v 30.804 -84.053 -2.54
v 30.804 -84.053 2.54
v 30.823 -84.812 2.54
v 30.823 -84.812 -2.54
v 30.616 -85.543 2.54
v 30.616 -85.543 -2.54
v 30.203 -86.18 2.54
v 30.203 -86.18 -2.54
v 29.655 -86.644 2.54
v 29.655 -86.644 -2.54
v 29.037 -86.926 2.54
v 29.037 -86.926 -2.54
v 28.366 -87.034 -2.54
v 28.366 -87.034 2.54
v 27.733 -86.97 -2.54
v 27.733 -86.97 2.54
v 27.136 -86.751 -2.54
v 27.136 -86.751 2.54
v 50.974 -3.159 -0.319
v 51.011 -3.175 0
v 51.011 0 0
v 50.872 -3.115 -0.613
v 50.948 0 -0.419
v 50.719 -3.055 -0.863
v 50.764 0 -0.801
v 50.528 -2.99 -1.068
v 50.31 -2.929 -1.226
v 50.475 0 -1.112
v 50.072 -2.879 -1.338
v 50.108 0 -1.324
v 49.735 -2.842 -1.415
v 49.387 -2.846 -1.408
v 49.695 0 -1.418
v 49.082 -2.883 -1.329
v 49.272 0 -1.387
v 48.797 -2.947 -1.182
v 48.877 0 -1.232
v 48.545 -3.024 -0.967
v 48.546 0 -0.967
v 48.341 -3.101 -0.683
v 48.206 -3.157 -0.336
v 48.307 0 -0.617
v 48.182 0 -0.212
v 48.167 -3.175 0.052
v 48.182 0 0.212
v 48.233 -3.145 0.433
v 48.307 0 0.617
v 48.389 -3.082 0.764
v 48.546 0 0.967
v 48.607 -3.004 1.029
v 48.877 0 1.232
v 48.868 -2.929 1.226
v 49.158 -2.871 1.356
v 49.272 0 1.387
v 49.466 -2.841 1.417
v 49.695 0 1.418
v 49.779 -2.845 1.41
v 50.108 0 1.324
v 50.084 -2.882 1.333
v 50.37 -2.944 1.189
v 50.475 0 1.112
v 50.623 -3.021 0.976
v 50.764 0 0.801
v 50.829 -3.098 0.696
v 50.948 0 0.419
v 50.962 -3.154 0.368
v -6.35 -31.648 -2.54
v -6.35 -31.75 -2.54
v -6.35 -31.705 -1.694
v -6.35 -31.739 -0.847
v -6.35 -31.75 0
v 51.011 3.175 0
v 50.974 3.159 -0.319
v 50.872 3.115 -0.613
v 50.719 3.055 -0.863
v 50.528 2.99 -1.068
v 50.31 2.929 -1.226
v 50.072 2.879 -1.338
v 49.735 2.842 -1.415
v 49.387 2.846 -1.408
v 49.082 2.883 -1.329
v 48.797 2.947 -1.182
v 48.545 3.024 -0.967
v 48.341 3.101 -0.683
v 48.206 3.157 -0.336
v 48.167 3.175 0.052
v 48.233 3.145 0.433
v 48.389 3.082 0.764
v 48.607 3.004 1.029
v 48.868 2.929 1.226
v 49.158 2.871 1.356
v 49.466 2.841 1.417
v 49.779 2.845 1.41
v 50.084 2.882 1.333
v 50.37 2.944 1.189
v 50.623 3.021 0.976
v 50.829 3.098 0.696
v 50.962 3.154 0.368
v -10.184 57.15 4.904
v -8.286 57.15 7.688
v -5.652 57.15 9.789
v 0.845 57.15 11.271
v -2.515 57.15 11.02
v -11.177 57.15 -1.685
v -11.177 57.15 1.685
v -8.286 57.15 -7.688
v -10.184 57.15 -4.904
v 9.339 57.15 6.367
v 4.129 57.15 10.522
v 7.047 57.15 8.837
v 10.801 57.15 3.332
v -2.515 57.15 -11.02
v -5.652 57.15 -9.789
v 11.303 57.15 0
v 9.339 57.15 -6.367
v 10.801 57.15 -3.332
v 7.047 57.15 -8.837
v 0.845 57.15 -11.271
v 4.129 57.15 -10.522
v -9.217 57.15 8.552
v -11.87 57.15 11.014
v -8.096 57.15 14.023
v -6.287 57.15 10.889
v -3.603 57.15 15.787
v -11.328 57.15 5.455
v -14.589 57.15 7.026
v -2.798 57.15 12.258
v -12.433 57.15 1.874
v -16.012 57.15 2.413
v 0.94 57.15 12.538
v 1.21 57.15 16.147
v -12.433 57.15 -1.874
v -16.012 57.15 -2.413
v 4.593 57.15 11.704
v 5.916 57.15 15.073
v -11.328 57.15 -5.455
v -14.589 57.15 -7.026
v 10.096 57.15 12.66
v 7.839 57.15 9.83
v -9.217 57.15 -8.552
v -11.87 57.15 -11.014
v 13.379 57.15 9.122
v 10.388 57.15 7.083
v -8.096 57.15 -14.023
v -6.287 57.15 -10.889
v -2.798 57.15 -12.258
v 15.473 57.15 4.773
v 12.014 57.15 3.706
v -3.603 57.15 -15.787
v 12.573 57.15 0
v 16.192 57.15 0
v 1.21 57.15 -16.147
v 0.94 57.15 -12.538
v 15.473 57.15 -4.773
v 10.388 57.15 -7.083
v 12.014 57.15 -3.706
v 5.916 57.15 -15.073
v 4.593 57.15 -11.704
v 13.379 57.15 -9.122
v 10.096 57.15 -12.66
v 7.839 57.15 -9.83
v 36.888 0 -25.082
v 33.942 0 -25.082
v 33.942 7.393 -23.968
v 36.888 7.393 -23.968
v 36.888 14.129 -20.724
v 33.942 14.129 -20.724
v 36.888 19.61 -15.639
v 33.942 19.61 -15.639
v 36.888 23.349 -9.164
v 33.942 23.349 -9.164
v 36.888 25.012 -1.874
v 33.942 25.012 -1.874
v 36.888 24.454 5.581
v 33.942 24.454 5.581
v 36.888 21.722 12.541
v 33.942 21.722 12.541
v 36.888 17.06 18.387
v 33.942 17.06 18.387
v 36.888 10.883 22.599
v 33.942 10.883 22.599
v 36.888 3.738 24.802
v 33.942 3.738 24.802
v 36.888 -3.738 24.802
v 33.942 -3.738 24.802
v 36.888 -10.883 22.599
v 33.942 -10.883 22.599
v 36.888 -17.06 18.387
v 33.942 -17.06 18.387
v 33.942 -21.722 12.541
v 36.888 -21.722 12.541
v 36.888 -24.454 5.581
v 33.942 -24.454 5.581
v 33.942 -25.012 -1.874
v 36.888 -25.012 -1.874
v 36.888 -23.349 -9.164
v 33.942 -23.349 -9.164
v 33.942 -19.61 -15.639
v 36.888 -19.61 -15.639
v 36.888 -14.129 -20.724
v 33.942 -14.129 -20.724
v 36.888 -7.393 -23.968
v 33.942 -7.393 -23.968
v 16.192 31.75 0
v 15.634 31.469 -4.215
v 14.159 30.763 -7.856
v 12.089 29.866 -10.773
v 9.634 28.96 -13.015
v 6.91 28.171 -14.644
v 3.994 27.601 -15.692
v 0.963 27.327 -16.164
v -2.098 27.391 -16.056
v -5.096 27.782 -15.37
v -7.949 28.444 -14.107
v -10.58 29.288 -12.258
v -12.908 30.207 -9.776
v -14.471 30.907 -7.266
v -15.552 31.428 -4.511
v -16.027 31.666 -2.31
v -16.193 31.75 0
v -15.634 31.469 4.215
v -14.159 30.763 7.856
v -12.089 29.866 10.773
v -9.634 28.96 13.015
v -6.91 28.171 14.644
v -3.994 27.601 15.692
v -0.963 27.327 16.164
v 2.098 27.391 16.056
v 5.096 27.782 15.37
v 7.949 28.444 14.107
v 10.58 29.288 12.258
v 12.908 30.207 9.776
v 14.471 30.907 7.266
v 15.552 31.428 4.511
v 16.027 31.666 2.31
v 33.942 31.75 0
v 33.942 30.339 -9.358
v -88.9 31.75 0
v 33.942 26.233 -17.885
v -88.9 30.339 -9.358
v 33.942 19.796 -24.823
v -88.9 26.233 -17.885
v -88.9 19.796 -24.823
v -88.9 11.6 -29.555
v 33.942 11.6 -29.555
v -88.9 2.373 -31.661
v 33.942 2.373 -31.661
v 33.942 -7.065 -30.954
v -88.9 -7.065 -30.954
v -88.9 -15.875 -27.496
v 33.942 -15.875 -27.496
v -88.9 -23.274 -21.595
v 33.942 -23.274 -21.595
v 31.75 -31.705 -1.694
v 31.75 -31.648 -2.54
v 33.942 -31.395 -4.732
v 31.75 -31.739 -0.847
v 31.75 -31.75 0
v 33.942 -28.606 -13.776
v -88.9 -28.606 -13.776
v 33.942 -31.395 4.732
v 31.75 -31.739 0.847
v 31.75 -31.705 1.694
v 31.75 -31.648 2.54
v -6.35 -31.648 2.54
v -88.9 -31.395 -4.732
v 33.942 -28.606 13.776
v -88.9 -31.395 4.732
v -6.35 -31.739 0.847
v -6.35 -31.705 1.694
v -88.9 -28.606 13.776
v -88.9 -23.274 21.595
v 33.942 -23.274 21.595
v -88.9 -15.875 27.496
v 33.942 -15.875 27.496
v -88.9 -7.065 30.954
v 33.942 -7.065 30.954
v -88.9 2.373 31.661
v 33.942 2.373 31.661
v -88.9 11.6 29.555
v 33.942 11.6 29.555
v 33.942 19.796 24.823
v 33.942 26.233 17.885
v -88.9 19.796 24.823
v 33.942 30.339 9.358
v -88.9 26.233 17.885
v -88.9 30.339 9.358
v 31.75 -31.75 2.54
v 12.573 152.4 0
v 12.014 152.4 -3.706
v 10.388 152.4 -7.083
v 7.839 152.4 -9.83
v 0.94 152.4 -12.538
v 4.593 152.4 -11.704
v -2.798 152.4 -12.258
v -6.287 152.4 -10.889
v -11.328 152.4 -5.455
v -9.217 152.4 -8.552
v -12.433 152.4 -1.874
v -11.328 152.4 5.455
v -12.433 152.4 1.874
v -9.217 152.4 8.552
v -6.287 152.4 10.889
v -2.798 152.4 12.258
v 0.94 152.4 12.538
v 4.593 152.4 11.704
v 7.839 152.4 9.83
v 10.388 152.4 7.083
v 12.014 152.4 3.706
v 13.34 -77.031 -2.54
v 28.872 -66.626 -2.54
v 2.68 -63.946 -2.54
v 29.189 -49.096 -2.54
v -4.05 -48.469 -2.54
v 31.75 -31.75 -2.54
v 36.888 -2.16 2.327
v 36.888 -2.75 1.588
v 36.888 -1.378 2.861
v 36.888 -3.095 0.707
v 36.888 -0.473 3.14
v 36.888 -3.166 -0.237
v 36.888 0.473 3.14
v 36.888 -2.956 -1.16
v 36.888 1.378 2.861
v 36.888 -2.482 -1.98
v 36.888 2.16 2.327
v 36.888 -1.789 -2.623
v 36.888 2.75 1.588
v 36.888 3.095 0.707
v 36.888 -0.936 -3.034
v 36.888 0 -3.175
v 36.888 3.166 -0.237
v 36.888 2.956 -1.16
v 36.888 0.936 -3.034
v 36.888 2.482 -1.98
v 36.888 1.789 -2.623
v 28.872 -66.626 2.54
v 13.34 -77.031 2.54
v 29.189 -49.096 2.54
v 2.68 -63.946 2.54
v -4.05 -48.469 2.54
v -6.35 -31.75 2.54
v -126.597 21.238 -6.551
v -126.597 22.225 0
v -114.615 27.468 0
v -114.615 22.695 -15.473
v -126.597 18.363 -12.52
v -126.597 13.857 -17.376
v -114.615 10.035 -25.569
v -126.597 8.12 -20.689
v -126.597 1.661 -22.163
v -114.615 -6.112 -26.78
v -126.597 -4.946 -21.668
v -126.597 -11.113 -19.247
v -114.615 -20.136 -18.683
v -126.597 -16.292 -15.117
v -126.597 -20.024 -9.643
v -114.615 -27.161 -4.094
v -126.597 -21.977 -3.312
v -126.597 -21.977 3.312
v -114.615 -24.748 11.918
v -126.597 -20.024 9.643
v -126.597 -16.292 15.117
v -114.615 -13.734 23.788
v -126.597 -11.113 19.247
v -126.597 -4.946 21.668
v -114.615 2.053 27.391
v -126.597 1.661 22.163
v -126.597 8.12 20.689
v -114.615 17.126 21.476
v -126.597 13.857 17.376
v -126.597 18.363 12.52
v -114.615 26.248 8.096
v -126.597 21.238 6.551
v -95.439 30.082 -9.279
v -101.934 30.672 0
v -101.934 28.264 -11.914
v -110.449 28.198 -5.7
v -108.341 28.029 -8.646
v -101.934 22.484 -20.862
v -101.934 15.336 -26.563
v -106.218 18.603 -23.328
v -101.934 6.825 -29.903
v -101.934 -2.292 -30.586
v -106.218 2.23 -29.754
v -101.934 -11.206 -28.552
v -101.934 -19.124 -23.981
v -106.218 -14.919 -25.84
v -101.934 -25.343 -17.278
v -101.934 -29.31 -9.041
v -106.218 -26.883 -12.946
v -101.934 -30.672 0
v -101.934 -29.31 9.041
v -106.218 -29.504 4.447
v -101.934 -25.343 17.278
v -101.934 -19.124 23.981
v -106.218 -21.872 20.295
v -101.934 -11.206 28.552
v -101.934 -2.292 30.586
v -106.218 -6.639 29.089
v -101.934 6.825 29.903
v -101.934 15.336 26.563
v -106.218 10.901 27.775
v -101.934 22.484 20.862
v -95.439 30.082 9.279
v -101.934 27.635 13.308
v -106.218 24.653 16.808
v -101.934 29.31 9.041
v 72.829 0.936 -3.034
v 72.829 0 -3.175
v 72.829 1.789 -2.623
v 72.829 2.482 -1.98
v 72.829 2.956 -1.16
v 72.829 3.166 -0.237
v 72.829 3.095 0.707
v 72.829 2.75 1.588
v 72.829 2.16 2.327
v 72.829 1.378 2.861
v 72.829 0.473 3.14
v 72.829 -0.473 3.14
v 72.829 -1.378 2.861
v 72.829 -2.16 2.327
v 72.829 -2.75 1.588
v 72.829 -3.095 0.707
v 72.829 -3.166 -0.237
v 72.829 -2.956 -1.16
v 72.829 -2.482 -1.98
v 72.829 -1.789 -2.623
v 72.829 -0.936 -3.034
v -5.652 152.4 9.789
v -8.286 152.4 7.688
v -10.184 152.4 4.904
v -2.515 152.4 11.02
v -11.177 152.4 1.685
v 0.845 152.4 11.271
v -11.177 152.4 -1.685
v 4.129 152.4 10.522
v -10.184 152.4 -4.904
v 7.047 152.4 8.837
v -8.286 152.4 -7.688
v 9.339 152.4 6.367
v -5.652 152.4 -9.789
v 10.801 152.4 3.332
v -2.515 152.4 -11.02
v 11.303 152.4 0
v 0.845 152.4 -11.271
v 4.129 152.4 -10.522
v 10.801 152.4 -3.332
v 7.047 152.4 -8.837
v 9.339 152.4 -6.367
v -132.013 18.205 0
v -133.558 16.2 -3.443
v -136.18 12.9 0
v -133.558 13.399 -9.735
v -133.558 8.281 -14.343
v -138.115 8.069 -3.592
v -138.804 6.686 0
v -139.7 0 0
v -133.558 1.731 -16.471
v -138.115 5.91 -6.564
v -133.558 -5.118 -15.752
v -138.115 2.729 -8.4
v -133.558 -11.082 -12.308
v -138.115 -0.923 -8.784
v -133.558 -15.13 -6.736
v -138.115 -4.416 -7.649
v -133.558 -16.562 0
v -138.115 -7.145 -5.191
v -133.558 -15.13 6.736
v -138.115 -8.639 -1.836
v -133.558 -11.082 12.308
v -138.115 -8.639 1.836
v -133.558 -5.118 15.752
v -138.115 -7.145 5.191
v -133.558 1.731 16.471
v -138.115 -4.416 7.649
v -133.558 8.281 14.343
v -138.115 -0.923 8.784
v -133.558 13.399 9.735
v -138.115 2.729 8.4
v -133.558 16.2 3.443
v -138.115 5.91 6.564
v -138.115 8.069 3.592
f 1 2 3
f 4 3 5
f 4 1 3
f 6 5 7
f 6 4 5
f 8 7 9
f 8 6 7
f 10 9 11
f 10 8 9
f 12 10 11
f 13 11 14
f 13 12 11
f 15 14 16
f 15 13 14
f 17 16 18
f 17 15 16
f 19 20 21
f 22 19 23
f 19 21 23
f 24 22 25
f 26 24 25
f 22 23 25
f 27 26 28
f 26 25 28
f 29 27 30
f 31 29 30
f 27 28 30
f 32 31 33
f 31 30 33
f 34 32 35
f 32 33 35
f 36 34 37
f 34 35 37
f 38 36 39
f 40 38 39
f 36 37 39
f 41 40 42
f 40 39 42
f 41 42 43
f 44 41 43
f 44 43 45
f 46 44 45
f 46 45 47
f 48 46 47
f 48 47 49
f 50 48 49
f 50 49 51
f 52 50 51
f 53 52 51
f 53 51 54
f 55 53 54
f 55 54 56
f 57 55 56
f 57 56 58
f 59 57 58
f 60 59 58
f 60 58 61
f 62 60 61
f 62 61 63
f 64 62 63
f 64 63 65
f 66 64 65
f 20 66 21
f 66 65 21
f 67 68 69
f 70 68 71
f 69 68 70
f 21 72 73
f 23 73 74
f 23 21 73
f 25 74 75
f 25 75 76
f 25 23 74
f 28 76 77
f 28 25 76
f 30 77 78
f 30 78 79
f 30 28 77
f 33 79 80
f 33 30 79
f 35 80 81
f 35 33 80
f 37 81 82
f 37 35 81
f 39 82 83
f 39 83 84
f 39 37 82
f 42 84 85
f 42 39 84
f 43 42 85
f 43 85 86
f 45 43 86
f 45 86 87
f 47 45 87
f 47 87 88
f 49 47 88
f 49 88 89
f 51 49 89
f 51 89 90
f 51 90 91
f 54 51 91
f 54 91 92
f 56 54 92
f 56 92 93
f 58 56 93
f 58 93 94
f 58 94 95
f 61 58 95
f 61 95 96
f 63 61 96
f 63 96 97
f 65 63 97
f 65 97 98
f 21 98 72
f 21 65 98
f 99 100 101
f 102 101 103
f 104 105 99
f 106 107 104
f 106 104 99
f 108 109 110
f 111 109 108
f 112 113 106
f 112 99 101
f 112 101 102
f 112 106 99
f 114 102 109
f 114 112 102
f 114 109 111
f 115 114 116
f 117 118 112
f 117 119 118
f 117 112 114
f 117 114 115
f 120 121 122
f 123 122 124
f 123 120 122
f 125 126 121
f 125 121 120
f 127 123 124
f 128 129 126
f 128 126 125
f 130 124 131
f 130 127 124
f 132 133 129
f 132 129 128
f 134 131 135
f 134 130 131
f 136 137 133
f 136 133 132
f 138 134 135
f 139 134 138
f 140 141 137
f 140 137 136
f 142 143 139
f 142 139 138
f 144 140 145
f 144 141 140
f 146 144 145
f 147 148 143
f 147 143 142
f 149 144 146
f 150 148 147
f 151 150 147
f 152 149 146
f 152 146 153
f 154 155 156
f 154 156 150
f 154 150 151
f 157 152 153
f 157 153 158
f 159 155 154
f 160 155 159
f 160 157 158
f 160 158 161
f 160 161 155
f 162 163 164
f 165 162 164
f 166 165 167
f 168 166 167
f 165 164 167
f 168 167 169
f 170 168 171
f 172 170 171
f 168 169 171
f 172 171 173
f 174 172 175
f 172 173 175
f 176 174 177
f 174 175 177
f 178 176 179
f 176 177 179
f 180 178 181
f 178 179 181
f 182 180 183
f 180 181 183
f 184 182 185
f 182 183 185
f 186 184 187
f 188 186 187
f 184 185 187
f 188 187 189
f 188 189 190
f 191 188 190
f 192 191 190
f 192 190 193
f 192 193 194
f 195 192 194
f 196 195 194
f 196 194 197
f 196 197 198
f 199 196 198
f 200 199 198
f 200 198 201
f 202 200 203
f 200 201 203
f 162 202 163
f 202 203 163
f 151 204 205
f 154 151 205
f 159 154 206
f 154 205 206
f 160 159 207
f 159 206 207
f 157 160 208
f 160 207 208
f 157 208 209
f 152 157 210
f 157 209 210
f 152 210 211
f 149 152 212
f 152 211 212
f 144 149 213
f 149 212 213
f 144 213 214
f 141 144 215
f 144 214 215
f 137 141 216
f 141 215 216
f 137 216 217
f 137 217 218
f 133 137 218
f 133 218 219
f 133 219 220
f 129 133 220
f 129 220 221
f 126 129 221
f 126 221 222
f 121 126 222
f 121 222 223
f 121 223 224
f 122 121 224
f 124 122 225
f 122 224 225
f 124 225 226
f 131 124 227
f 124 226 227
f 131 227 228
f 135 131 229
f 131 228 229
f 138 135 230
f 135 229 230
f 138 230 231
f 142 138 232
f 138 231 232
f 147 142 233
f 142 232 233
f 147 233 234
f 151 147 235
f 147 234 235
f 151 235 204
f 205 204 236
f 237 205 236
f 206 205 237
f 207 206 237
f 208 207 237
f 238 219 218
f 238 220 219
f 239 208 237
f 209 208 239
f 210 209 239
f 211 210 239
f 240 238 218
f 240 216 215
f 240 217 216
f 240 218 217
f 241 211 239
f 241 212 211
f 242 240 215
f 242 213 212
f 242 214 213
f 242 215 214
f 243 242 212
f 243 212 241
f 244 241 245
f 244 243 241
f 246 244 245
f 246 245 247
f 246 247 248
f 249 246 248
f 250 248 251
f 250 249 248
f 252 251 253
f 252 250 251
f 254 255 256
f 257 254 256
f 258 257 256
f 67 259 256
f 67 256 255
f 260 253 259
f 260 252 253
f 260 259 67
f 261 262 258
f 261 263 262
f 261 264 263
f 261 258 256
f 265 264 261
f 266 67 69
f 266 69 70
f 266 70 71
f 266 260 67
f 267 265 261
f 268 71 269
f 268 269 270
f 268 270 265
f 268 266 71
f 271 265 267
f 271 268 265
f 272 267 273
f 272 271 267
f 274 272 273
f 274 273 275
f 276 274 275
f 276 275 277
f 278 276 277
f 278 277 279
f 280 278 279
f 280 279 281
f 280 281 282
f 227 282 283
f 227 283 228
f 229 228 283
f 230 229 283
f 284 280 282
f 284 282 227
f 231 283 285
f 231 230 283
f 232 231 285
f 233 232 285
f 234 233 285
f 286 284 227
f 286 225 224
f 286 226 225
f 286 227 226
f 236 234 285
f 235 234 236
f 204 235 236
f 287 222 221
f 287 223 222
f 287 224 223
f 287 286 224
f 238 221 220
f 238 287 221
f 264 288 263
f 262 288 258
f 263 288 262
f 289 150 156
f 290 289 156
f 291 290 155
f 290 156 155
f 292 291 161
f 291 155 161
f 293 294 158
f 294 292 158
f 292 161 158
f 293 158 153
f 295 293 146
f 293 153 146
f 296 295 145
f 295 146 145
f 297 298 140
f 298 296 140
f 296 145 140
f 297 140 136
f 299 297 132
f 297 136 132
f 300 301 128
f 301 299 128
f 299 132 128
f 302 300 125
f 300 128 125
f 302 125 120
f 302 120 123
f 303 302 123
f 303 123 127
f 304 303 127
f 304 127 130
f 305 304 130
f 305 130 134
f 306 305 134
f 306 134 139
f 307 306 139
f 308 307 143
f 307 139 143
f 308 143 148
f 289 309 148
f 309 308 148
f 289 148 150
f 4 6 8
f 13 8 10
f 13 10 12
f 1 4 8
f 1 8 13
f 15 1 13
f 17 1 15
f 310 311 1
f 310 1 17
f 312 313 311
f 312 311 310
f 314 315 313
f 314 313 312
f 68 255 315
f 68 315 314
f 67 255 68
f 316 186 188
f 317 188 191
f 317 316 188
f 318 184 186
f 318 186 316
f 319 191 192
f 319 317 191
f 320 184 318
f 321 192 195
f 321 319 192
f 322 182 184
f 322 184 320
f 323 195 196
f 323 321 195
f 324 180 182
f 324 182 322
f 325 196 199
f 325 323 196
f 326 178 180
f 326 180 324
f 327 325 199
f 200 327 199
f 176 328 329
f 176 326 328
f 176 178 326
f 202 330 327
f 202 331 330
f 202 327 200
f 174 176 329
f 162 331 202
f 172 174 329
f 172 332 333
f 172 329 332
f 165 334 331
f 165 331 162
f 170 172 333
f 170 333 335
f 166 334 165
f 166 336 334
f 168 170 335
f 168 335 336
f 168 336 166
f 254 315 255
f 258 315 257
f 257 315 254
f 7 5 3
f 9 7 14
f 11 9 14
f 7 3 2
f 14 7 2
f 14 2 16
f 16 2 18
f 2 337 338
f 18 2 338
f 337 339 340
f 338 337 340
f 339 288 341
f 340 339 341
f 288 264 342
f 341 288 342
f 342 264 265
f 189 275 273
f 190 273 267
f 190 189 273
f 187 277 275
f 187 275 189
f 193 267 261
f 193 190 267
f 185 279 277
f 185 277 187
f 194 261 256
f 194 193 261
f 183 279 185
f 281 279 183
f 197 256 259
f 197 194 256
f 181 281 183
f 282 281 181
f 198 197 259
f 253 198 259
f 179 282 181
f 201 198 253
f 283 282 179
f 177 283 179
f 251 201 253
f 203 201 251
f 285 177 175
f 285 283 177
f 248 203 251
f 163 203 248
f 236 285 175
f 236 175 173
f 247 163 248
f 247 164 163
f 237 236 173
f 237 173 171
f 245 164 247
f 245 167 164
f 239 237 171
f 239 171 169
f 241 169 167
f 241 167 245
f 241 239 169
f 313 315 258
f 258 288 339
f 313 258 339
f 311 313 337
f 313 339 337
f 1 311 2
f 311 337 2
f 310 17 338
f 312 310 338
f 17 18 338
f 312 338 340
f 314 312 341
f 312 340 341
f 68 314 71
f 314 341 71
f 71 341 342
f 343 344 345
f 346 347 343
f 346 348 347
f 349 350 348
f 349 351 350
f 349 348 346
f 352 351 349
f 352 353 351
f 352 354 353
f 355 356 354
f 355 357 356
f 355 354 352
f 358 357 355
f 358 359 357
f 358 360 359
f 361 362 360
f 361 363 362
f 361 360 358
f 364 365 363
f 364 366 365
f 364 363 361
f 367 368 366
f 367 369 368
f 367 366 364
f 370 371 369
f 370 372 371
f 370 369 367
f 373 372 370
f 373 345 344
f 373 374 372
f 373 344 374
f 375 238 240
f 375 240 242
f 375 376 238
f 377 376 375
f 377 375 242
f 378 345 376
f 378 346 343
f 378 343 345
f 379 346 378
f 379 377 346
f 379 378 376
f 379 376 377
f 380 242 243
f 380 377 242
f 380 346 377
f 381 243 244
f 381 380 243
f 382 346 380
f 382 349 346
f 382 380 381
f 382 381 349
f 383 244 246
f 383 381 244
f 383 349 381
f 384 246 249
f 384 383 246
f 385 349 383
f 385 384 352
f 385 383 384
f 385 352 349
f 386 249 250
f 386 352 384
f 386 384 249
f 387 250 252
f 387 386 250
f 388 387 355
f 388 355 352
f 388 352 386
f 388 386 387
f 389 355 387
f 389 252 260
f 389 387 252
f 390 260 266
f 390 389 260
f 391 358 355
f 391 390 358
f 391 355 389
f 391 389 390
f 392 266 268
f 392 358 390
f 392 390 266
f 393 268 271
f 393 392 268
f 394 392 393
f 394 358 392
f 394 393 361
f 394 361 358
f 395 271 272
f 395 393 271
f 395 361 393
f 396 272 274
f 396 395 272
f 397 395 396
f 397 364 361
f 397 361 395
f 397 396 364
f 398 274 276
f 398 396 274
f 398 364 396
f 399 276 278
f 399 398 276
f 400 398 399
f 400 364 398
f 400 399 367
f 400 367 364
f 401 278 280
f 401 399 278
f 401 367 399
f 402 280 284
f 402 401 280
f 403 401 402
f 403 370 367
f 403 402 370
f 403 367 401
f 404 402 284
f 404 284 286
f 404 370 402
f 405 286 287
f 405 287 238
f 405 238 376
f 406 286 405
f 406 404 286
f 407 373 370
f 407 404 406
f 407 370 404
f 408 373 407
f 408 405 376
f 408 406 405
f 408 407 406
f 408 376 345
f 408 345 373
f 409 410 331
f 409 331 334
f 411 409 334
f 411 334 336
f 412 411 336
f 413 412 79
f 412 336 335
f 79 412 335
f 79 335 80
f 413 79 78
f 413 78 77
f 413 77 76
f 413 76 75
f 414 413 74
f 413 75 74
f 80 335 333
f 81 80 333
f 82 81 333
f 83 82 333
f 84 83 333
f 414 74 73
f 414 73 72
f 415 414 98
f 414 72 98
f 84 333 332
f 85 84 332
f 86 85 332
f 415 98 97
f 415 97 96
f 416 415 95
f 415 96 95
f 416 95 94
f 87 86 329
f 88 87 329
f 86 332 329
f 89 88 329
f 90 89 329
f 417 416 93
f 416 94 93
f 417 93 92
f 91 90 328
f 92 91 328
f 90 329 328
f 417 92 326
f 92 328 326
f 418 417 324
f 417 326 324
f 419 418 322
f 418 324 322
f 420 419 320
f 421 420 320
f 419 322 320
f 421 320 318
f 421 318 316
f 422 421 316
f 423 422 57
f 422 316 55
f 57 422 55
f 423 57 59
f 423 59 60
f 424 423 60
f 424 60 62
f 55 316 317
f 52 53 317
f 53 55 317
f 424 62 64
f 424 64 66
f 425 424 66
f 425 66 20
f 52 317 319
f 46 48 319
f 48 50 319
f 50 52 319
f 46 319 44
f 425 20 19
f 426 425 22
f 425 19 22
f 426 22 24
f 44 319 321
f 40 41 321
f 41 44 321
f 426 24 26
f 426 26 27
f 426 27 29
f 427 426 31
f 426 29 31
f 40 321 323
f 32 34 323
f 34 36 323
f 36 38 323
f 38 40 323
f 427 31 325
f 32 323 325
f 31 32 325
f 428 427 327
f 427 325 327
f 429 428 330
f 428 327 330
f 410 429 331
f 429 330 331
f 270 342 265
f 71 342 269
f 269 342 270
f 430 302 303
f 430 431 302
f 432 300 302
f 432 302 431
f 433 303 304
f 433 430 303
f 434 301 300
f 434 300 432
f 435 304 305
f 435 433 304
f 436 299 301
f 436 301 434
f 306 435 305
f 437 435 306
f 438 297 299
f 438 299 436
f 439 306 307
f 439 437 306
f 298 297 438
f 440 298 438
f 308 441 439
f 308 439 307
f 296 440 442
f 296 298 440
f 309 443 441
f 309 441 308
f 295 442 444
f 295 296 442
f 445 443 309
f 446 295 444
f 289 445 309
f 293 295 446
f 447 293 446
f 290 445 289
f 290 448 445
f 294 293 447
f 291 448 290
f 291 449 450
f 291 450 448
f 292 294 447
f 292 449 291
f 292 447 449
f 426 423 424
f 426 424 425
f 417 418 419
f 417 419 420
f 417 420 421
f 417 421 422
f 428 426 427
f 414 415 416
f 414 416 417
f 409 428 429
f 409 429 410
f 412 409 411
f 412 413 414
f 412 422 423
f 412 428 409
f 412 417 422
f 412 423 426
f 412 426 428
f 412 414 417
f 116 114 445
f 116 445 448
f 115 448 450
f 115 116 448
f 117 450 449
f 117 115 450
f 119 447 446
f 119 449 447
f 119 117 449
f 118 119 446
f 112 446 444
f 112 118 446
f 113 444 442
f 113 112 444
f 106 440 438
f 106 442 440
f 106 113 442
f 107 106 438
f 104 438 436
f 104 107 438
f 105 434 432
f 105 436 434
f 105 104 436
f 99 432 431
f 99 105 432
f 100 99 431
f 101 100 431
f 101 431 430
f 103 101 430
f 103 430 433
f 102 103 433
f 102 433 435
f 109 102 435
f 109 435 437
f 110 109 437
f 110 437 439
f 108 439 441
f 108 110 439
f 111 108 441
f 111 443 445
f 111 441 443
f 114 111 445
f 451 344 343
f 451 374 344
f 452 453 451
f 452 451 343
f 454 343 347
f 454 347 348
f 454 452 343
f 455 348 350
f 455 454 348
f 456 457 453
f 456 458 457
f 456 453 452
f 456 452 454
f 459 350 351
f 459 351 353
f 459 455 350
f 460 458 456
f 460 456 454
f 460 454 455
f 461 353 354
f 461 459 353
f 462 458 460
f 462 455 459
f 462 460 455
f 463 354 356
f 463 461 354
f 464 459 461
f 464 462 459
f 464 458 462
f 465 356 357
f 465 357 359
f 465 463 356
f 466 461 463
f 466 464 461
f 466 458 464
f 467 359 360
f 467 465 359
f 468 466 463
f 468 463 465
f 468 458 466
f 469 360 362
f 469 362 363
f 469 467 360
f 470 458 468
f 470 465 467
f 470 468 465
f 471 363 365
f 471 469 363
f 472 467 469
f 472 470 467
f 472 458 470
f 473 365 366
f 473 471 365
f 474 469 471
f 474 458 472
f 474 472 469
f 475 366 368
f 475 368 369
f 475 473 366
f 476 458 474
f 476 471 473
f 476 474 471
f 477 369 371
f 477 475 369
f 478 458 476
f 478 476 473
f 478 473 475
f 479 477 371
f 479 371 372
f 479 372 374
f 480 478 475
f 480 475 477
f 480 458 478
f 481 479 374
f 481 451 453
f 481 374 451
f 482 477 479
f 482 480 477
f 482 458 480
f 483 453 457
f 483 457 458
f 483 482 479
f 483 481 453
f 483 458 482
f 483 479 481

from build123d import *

# Parameters (mm, degrees)
SKETCH2_R                = 12.573
SKETCH2_R_2              = 11.303
BOSS_EXTRUDE1_DEPTH      = 635
SKETCH4_W                = 38.1
SKETCH4_H                = 6.35
BOSS_EXTRUDE3_DEPTH      = 2.54
BOSS_EXTRUDE3_DEPTH_BACK = 2.54
FILLET1_R                = 2.54
SKETCH5_R                = 16.1925
BOSS_EXTRUDE4_DEPTH      = 57.15
SKETCH6_W                = 25.146
SKETCH6_H                = 355.6
CUT_EXTRUDE1_DEPTH       = 32.7500001
CUT_EXTRUDE1_DEPTH_BACK  = 32.7500001
SKETCH7_R                = 36.277914584
CUT_EXTRUDE2_DEPTH       = 4.15798
SKETCH8_R                = 25.0825
BOSS_EXTRUDE5_DEPTH      = 2.9464
SKETCH9_R                = 3.175
BOSS_EXTRUDE6_DEPTH      = 35.941
SKETCH10_R               = 1.4224
CUT_EXTRUDE3_DEPTH       = 280.4
CUT_EXTRUDE3_DEPTH_BACK  = 88.034563121
SKETCH11_R               = 17.161337021
CUT_EXTRUDE4_DEPTH       = 127


with BuildPart() as part:
    # Sketch1 one side → Revolve1 (revolve)
    with BuildSketch(Plane.XY):
        with BuildLine():
            Line((38.1, 31.75), (-88.9, 31.75))
            ThreePointArc((-88.9, 31.75), (-108.34073355, 29.331909563), (-126.596722124, 22.225))
            ThreePointArc((-126.596722124, 22.225), (-136.180319261, 12.90006314), (-139.7, 0))
            Line((-139.7, 0), (-88.9, 0))
            Line((-88.9, 0), (38.1, 0))
            Line((38.1, 0), (38.1, 31.75))
        make_face()
    revolve(axis=Axis((0, 0, 0), (-1, 0, 0)))

    # Sketch2 → Boss-Extrude1 (add)
    with BuildSketch(Plane(origin=(0, 0, 0), x_dir=(1, 0, 0), z_dir=(0, 1, 0))):
        Circle(SKETCH2_R)
        Circle(SKETCH2_R_2, mode=Mode.SUBTRACT)
    extrude(amount=BOSS_EXTRUDE1_DEPTH)

    # Sketch4 → Boss-Extrude3 (add, two sides)
    with BuildSketch(Plane.XY) as boss_extrude3_sk:
        with BuildLine():
            ThreePointArc((31.75, -31.75), (28.726104864, -60.325), (31.75, -88.9))
            ThreePointArc((31.75, -88.9), (4.048186152, -66.092875899), (-6.35, -31.75))
            Line((-6.35, -31.75), (31.75, -31.75))
        make_face()
        with Locations((12.7, -28.575)):
            Rectangle(SKETCH4_W, SKETCH4_H)
    extrude(amount=BOSS_EXTRUDE3_DEPTH)
    extrude(boss_extrude3_sk.sketch, amount=-BOSS_EXTRUDE3_DEPTH_BACK)

    # Fillet1
    fillet1_edges = [part.edges().sort_by_distance(p)[0] for p in [
        (31.75, -88.9, 0),
    ]]
    fillet(fillet1_edges, radius=FILLET1_R)

    # Sketch5 → Boss-Extrude4 (add)
    with BuildSketch(Plane(origin=(0, 0, 0), x_dir=(1, 0, 0), z_dir=(0, 1, 0))):
        Circle(SKETCH5_R)
    extrude(amount=BOSS_EXTRUDE4_DEPTH)

    # Sketch6 → Cut-Extrude1 (cut, two sides)
    with BuildSketch(Plane.XY) as cut_extrude1_sk:
        with Locations((0, 457.2)):
            Rectangle(SKETCH6_W, SKETCH6_H)
    extrude(amount=CUT_EXTRUDE1_DEPTH, mode=Mode.SUBTRACT)
    extrude(cut_extrude1_sk.sketch, amount=-CUT_EXTRUDE1_DEPTH_BACK, mode=Mode.SUBTRACT)

    # Sketch7 → Cut-Extrude2 (cut)
    with BuildSketch(Plane(origin=(38.1, 0, 0), x_dir=(0, 0, -1), z_dir=(1, 0, 0))):
        Circle(SKETCH7_R)
    extrude(amount=-CUT_EXTRUDE2_DEPTH, mode=Mode.SUBTRACT)

    # Sketch8 → Boss-Extrude5 (add)
    with BuildSketch(Plane(origin=(33.94202, 0, 0), x_dir=(0, 0, -1), z_dir=(1, 0, 0))):
        Circle(SKETCH8_R)
    extrude(amount=BOSS_EXTRUDE5_DEPTH)

    # Sketch9 → Boss-Extrude6 (add)
    with BuildSketch(Plane(origin=(36.88842, 0, 0), x_dir=(0, 0, -1), z_dir=(1, 0, 0))):
        Circle(SKETCH9_R)
    extrude(amount=BOSS_EXTRUDE6_DEPTH)

    # Sketch10 → Cut-Extrude3 (cut, two sides)
    with BuildSketch(Plane(origin=(0, 0, 0), x_dir=(1, 0, 0), z_dir=(0, 1, 0))) as cut_extrude3_sk:
        with Locations((49.58842, 0)):
            Circle(SKETCH10_R)
    extrude(amount=CUT_EXTRUDE3_DEPTH, mode=Mode.SUBTRACT)
    extrude(cut_extrude3_sk.sketch, amount=-CUT_EXTRUDE3_DEPTH_BACK, mode=Mode.SUBTRACT)

    # Sketch11 → Cut-Extrude4 (cut)
    with BuildSketch(Plane(origin=(0, 279.4, 0), x_dir=(1, 0, 0), z_dir=(0, 1, 0))):
        Circle(SKETCH11_R)
    extrude(amount=-CUT_EXTRUDE4_DEPTH, mode=Mode.SUBTRACT)


solid = part.part
